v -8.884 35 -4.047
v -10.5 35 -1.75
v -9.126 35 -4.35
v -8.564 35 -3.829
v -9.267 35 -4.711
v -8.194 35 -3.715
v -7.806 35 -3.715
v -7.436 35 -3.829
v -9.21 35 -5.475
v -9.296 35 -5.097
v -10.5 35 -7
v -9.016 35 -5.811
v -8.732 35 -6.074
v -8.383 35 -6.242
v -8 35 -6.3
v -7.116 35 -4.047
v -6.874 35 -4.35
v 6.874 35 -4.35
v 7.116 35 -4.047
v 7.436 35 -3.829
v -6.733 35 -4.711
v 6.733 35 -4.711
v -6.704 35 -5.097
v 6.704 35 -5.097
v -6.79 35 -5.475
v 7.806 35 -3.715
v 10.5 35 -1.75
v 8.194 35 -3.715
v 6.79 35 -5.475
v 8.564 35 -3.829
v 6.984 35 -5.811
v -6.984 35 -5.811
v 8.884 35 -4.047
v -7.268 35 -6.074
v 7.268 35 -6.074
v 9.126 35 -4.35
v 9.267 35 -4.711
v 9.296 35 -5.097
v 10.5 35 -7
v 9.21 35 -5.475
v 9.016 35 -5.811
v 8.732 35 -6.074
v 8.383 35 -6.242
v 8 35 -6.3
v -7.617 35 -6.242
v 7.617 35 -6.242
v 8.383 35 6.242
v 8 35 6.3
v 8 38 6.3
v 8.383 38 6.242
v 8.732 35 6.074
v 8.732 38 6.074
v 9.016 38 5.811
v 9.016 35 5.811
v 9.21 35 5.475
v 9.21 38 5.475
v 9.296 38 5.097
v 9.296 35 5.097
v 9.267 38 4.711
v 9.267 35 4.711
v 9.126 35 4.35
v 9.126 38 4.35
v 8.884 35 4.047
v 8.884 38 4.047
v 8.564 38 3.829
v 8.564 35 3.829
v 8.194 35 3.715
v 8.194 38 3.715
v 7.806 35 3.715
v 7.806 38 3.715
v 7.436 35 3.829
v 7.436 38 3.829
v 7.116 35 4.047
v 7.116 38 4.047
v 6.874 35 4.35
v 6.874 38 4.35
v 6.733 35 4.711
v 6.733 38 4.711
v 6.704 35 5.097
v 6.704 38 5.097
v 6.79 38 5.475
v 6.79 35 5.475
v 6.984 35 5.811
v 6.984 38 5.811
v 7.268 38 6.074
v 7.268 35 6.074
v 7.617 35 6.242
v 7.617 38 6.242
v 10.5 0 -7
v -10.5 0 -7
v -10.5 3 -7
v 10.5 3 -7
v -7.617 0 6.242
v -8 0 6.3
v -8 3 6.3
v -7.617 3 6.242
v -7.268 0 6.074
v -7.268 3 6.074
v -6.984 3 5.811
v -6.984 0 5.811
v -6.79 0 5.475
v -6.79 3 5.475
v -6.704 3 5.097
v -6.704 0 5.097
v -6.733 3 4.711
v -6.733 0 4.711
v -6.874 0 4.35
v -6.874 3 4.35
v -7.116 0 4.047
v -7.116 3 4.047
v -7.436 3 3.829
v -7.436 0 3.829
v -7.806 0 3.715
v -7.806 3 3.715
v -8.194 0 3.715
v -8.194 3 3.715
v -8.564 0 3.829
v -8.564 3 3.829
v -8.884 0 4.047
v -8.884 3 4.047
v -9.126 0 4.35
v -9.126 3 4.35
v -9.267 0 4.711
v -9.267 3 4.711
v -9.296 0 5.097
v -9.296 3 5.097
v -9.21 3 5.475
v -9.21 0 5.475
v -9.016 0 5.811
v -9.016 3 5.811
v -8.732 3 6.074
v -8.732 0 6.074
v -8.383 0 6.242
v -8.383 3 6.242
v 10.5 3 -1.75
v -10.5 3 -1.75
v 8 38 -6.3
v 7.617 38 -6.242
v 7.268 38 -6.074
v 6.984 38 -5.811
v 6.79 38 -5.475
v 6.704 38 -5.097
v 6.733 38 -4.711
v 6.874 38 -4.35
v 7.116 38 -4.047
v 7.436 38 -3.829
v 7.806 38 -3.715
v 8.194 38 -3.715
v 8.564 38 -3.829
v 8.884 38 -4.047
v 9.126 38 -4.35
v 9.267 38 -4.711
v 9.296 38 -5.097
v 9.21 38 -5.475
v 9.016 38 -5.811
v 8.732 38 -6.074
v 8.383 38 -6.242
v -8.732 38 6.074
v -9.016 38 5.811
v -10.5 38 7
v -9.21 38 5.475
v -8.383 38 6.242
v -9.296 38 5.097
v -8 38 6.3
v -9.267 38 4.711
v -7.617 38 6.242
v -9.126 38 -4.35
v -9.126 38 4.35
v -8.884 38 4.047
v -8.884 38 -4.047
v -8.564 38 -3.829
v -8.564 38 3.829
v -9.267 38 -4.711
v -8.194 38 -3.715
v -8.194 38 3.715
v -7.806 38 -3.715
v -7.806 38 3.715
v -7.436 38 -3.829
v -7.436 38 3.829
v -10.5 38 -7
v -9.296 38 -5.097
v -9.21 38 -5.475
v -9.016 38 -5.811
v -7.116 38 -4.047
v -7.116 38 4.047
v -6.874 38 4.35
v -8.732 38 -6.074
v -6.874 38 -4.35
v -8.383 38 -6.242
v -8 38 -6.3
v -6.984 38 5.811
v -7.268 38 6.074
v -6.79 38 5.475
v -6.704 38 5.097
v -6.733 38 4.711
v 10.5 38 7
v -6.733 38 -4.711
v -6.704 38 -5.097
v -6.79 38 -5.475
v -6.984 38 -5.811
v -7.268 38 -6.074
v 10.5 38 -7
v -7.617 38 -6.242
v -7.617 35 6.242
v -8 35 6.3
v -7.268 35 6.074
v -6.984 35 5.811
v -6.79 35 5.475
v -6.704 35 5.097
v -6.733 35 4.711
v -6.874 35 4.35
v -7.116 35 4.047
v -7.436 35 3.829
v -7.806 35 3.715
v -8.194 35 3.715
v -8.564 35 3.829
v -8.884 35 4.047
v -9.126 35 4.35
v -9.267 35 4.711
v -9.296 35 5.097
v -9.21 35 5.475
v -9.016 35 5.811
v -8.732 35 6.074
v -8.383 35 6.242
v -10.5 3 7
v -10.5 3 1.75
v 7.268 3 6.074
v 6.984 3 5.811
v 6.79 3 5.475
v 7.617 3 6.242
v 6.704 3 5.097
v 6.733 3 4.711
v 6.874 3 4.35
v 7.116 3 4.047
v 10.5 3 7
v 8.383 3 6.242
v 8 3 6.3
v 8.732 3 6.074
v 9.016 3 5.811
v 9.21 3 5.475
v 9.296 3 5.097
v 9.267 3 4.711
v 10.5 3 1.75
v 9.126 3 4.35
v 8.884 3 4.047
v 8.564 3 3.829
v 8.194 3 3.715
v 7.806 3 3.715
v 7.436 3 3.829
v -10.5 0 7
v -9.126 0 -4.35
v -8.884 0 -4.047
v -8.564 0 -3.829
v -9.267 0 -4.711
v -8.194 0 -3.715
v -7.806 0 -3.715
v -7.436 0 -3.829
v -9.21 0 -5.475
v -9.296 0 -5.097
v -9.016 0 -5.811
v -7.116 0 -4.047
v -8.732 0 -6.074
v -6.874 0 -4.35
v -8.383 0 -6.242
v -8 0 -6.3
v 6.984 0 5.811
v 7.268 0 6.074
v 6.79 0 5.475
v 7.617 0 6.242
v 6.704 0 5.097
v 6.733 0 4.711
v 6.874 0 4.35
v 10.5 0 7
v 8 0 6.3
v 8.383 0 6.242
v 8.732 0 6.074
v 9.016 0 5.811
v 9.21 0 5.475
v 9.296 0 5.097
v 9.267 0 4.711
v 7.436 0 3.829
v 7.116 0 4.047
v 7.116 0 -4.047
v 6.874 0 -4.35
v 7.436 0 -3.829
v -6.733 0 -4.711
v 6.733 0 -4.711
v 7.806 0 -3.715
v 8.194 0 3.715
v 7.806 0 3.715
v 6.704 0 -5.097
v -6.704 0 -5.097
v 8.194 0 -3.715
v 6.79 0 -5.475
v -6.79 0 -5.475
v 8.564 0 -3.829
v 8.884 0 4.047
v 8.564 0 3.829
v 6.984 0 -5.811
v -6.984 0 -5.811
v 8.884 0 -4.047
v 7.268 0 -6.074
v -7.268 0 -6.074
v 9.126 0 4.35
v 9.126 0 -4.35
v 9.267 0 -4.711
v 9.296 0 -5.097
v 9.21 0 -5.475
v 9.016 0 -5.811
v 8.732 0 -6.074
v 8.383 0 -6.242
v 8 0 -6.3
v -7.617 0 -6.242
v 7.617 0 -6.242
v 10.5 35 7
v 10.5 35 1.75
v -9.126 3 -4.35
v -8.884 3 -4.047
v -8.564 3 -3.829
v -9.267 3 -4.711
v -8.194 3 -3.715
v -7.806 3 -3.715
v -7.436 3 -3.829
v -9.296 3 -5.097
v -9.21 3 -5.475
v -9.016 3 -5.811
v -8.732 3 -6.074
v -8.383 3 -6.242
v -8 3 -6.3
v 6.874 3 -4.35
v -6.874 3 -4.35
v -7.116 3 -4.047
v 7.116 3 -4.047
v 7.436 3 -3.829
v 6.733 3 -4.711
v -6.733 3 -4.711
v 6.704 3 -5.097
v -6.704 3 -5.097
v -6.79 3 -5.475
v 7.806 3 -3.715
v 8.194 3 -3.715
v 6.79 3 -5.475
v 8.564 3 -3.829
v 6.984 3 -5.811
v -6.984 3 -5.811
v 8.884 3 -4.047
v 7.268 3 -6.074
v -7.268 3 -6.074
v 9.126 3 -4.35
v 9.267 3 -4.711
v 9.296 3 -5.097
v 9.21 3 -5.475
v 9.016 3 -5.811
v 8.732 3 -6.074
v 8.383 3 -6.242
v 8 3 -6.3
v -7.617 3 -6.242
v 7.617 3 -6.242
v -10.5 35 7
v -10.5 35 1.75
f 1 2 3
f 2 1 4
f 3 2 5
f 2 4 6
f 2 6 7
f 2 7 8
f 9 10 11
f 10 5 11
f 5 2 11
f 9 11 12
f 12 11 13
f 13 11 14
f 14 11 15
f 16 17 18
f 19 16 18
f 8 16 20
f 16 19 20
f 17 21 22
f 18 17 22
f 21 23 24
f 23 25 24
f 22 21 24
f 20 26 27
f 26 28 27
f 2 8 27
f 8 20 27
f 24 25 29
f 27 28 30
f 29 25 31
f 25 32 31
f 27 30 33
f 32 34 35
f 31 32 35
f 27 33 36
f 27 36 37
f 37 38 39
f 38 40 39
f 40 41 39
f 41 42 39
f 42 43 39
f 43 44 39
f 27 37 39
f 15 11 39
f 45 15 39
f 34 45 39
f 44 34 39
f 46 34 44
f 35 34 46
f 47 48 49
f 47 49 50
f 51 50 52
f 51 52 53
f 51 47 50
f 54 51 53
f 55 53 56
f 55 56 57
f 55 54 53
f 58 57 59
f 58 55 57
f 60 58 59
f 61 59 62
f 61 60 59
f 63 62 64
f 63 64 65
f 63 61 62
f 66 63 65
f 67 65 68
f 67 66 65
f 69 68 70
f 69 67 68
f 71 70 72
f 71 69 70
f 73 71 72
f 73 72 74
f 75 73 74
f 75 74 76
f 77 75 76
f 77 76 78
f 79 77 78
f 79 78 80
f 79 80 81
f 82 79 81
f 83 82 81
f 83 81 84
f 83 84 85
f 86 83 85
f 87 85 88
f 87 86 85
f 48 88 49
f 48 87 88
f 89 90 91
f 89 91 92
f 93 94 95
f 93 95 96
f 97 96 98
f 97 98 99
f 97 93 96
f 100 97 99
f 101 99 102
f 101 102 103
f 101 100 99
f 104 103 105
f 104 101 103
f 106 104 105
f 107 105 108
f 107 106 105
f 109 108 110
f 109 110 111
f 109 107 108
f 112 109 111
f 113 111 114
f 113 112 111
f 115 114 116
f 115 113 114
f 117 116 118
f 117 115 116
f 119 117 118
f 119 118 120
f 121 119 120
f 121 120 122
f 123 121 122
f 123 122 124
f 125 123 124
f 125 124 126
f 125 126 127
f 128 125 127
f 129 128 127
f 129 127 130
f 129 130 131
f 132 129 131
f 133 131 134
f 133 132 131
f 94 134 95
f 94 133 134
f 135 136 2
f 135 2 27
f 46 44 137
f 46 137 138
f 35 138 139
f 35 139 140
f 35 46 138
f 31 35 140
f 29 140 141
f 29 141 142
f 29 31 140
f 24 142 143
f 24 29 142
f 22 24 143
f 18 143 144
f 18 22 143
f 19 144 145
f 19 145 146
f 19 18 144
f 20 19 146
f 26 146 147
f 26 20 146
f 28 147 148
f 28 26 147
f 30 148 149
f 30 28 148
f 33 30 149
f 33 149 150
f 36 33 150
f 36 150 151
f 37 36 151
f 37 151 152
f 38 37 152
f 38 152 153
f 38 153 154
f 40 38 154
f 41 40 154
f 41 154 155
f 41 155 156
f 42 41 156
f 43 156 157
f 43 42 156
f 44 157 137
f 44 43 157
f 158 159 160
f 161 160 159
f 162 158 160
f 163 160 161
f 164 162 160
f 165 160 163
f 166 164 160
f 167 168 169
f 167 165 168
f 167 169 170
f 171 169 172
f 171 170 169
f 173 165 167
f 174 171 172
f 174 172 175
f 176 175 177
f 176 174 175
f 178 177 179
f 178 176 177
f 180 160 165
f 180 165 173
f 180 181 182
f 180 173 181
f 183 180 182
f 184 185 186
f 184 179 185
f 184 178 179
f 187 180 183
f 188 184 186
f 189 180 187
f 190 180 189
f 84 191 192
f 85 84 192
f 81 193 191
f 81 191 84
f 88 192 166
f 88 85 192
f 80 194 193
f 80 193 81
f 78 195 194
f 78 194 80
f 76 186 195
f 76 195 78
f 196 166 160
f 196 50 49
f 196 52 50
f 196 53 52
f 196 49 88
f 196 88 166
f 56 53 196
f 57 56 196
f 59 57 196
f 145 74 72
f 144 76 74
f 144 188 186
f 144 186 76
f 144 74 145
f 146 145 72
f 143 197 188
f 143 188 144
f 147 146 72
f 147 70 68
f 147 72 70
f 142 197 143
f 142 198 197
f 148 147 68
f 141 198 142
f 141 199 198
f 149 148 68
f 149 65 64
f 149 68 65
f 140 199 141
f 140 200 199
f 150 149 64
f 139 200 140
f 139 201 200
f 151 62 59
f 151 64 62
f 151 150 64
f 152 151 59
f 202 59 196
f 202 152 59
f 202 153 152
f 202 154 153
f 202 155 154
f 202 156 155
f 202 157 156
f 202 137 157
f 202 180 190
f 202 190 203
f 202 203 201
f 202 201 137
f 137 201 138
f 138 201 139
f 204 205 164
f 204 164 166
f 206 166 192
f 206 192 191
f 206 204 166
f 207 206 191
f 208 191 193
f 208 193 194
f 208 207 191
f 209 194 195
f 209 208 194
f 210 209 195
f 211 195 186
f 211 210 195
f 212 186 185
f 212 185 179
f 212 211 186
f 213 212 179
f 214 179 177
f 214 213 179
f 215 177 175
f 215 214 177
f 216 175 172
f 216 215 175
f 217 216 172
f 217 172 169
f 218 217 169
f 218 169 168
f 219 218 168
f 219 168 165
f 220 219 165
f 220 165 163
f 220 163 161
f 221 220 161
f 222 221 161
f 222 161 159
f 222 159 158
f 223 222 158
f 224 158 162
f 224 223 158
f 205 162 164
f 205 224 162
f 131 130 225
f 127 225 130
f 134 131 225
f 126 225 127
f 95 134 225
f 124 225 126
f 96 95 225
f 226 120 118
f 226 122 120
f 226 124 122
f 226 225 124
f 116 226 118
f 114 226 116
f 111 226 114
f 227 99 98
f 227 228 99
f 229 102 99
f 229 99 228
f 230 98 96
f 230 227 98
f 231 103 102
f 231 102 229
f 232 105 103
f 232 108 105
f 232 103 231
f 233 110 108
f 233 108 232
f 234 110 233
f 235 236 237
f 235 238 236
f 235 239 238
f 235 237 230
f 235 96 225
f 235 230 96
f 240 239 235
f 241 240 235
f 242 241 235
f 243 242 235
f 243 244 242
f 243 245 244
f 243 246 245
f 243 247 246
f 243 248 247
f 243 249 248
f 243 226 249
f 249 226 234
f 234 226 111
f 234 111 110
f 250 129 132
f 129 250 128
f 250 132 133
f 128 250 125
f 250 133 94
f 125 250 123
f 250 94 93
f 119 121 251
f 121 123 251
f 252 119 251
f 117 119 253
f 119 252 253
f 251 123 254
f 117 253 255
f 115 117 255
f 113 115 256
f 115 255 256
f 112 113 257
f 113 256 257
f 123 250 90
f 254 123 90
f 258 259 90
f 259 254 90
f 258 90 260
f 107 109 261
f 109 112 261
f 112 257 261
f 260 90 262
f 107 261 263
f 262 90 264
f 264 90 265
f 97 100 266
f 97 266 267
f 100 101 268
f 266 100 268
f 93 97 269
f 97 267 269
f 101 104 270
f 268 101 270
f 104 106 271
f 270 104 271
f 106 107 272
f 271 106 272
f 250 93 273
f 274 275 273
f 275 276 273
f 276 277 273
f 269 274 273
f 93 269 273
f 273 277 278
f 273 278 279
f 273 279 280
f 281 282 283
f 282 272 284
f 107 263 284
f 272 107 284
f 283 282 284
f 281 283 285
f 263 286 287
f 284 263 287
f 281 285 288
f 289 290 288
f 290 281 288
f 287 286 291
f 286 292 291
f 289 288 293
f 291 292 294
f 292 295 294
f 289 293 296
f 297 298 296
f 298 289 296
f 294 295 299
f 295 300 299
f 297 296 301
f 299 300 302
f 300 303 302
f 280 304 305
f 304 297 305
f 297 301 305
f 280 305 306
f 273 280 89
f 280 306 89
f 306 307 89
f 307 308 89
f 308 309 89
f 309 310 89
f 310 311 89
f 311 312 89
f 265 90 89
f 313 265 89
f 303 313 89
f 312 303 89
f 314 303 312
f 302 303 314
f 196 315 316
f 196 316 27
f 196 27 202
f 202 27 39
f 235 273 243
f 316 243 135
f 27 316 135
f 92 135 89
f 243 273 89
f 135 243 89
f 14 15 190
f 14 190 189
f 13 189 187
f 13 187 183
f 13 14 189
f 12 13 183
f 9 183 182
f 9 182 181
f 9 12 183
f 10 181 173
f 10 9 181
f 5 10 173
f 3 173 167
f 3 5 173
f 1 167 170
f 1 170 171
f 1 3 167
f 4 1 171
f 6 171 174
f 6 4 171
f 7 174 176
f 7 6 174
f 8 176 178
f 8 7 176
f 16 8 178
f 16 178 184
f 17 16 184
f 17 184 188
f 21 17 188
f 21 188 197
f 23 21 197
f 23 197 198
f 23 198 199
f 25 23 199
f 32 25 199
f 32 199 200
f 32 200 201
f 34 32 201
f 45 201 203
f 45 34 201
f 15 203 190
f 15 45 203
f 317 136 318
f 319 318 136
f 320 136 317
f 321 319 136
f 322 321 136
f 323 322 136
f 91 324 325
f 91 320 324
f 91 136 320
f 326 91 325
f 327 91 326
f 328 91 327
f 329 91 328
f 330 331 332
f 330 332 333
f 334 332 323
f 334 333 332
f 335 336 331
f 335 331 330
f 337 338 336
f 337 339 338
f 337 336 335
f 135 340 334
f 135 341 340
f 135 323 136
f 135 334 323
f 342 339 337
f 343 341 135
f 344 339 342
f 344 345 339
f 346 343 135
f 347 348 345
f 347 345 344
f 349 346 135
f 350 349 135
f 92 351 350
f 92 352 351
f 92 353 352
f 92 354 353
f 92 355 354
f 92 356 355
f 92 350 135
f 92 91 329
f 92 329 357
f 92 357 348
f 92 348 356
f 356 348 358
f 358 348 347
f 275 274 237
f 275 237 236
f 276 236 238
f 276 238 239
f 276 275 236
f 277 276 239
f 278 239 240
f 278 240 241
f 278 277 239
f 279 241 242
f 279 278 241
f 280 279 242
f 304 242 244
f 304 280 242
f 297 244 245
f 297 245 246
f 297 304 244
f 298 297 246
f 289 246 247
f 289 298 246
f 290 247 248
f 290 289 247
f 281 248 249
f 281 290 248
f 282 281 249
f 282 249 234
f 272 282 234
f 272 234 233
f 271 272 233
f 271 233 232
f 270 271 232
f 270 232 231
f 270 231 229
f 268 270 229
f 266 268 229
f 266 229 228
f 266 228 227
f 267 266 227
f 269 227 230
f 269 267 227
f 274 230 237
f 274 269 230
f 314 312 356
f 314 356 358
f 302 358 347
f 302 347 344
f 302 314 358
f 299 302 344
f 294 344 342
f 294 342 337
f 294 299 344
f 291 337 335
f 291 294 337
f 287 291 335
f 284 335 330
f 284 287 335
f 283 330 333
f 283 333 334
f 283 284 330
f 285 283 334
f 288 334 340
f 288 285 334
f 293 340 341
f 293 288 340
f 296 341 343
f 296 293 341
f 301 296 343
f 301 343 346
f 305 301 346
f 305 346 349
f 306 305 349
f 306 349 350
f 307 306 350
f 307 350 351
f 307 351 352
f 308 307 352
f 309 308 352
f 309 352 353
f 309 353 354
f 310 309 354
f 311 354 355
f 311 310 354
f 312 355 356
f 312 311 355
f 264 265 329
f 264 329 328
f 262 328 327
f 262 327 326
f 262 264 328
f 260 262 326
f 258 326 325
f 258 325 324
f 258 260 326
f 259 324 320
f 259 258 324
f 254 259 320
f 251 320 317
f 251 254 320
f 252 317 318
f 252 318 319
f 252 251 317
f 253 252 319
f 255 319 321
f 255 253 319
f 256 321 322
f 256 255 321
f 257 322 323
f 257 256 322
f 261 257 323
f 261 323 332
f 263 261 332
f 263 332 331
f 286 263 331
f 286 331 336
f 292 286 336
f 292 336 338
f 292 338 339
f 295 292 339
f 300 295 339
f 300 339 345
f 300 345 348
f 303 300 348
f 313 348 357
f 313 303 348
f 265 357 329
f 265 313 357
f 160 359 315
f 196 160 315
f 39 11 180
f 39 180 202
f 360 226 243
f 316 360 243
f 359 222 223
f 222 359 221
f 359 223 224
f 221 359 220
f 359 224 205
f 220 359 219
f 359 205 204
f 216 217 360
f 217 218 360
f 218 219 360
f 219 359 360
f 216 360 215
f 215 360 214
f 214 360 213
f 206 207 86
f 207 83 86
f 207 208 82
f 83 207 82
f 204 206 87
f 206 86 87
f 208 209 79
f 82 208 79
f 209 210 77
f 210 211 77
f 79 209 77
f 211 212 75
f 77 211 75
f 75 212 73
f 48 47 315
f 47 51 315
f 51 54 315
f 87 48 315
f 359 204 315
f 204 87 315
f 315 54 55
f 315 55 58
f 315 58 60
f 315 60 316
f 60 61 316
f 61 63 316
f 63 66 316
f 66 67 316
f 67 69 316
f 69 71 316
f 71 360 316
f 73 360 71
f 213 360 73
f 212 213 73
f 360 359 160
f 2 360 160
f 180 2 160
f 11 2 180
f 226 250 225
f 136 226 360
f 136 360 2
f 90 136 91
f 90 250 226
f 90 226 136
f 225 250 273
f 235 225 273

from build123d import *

# Parameters (mm, degrees)
SKETCH3_W           = 21
SKETCH3_H           = 14
SKETCH3_R           = 1.3
BOSS_EXTRUDE1_DEPTH = 3
SKETCH4_W           = 21
SKETCH4_H           = 3.5
BOSS_EXTRUDE2_DEPTH = 32
SKETCH5_W           = 21
SKETCH5_H           = 14
SKETCH5_R           = 1.3
BOSS_EXTRUDE3_DEPTH = 3


with BuildPart() as part:
    # Sketch3 → Boss-Extrude1 (new body)
    with BuildSketch(Plane(origin=(0, 0, 0), x_dir=(1, 0, 0), z_dir=(0, 1, 0))):
        Rectangle(SKETCH3_W, SKETCH3_H)
        with Locations(Location((-8, -5, 0), (0, 0, 270))):
            Circle(SKETCH3_R, mode=Mode.SUBTRACT)
        with Locations(Location((8, -5, 0), (0, 0, 270))):
            Circle(SKETCH3_R, mode=Mode.SUBTRACT)
        with Locations(Location((8, 5, 0), (0, 0, 90))):
            Circle(SKETCH3_R, mode=Mode.SUBTRACT)
        with Locations(Location((-8, 5, 0), (0, 0, 90))):
            Circle(SKETCH3_R, mode=Mode.SUBTRACT)
    extrude(amount=BOSS_EXTRUDE1_DEPTH)

    # Sketch4 → Boss-Extrude2 (add)
    with BuildSketch(Plane(origin=(0, 3, 0), x_dir=(1, 0, 0), z_dir=(0, 1, 0))):
        Rectangle(SKETCH4_W, SKETCH4_H)
    extrude(amount=BOSS_EXTRUDE2_DEPTH)

    # Sketch5 → Boss-Extrude3 (add)
    with BuildSketch(Plane(origin=(0, 35, 0), x_dir=(1, 0, 0), z_dir=(0, 1, 0))):
        Rectangle(SKETCH5_W, SKETCH5_H)
        with Locations(Location((-8, -5, 0), (0, 0, 270))):
            Circle(SKETCH5_R, mode=Mode.SUBTRACT)
        with Locations(Location((-8, 5, 0), (0, 0, 90))):
            Circle(SKETCH5_R, mode=Mode.SUBTRACT)
        with Locations(Location((8, 5, 0), (0, 0, 90))):
            Circle(SKETCH5_R, mode=Mode.SUBTRACT)
        with Locations(Location((8, -5, 0), (0, 0, 270))):
            Circle(SKETCH5_R, mode=Mode.SUBTRACT)
    extrude(amount=BOSS_EXTRUDE3_DEPTH)


solid = part.part
